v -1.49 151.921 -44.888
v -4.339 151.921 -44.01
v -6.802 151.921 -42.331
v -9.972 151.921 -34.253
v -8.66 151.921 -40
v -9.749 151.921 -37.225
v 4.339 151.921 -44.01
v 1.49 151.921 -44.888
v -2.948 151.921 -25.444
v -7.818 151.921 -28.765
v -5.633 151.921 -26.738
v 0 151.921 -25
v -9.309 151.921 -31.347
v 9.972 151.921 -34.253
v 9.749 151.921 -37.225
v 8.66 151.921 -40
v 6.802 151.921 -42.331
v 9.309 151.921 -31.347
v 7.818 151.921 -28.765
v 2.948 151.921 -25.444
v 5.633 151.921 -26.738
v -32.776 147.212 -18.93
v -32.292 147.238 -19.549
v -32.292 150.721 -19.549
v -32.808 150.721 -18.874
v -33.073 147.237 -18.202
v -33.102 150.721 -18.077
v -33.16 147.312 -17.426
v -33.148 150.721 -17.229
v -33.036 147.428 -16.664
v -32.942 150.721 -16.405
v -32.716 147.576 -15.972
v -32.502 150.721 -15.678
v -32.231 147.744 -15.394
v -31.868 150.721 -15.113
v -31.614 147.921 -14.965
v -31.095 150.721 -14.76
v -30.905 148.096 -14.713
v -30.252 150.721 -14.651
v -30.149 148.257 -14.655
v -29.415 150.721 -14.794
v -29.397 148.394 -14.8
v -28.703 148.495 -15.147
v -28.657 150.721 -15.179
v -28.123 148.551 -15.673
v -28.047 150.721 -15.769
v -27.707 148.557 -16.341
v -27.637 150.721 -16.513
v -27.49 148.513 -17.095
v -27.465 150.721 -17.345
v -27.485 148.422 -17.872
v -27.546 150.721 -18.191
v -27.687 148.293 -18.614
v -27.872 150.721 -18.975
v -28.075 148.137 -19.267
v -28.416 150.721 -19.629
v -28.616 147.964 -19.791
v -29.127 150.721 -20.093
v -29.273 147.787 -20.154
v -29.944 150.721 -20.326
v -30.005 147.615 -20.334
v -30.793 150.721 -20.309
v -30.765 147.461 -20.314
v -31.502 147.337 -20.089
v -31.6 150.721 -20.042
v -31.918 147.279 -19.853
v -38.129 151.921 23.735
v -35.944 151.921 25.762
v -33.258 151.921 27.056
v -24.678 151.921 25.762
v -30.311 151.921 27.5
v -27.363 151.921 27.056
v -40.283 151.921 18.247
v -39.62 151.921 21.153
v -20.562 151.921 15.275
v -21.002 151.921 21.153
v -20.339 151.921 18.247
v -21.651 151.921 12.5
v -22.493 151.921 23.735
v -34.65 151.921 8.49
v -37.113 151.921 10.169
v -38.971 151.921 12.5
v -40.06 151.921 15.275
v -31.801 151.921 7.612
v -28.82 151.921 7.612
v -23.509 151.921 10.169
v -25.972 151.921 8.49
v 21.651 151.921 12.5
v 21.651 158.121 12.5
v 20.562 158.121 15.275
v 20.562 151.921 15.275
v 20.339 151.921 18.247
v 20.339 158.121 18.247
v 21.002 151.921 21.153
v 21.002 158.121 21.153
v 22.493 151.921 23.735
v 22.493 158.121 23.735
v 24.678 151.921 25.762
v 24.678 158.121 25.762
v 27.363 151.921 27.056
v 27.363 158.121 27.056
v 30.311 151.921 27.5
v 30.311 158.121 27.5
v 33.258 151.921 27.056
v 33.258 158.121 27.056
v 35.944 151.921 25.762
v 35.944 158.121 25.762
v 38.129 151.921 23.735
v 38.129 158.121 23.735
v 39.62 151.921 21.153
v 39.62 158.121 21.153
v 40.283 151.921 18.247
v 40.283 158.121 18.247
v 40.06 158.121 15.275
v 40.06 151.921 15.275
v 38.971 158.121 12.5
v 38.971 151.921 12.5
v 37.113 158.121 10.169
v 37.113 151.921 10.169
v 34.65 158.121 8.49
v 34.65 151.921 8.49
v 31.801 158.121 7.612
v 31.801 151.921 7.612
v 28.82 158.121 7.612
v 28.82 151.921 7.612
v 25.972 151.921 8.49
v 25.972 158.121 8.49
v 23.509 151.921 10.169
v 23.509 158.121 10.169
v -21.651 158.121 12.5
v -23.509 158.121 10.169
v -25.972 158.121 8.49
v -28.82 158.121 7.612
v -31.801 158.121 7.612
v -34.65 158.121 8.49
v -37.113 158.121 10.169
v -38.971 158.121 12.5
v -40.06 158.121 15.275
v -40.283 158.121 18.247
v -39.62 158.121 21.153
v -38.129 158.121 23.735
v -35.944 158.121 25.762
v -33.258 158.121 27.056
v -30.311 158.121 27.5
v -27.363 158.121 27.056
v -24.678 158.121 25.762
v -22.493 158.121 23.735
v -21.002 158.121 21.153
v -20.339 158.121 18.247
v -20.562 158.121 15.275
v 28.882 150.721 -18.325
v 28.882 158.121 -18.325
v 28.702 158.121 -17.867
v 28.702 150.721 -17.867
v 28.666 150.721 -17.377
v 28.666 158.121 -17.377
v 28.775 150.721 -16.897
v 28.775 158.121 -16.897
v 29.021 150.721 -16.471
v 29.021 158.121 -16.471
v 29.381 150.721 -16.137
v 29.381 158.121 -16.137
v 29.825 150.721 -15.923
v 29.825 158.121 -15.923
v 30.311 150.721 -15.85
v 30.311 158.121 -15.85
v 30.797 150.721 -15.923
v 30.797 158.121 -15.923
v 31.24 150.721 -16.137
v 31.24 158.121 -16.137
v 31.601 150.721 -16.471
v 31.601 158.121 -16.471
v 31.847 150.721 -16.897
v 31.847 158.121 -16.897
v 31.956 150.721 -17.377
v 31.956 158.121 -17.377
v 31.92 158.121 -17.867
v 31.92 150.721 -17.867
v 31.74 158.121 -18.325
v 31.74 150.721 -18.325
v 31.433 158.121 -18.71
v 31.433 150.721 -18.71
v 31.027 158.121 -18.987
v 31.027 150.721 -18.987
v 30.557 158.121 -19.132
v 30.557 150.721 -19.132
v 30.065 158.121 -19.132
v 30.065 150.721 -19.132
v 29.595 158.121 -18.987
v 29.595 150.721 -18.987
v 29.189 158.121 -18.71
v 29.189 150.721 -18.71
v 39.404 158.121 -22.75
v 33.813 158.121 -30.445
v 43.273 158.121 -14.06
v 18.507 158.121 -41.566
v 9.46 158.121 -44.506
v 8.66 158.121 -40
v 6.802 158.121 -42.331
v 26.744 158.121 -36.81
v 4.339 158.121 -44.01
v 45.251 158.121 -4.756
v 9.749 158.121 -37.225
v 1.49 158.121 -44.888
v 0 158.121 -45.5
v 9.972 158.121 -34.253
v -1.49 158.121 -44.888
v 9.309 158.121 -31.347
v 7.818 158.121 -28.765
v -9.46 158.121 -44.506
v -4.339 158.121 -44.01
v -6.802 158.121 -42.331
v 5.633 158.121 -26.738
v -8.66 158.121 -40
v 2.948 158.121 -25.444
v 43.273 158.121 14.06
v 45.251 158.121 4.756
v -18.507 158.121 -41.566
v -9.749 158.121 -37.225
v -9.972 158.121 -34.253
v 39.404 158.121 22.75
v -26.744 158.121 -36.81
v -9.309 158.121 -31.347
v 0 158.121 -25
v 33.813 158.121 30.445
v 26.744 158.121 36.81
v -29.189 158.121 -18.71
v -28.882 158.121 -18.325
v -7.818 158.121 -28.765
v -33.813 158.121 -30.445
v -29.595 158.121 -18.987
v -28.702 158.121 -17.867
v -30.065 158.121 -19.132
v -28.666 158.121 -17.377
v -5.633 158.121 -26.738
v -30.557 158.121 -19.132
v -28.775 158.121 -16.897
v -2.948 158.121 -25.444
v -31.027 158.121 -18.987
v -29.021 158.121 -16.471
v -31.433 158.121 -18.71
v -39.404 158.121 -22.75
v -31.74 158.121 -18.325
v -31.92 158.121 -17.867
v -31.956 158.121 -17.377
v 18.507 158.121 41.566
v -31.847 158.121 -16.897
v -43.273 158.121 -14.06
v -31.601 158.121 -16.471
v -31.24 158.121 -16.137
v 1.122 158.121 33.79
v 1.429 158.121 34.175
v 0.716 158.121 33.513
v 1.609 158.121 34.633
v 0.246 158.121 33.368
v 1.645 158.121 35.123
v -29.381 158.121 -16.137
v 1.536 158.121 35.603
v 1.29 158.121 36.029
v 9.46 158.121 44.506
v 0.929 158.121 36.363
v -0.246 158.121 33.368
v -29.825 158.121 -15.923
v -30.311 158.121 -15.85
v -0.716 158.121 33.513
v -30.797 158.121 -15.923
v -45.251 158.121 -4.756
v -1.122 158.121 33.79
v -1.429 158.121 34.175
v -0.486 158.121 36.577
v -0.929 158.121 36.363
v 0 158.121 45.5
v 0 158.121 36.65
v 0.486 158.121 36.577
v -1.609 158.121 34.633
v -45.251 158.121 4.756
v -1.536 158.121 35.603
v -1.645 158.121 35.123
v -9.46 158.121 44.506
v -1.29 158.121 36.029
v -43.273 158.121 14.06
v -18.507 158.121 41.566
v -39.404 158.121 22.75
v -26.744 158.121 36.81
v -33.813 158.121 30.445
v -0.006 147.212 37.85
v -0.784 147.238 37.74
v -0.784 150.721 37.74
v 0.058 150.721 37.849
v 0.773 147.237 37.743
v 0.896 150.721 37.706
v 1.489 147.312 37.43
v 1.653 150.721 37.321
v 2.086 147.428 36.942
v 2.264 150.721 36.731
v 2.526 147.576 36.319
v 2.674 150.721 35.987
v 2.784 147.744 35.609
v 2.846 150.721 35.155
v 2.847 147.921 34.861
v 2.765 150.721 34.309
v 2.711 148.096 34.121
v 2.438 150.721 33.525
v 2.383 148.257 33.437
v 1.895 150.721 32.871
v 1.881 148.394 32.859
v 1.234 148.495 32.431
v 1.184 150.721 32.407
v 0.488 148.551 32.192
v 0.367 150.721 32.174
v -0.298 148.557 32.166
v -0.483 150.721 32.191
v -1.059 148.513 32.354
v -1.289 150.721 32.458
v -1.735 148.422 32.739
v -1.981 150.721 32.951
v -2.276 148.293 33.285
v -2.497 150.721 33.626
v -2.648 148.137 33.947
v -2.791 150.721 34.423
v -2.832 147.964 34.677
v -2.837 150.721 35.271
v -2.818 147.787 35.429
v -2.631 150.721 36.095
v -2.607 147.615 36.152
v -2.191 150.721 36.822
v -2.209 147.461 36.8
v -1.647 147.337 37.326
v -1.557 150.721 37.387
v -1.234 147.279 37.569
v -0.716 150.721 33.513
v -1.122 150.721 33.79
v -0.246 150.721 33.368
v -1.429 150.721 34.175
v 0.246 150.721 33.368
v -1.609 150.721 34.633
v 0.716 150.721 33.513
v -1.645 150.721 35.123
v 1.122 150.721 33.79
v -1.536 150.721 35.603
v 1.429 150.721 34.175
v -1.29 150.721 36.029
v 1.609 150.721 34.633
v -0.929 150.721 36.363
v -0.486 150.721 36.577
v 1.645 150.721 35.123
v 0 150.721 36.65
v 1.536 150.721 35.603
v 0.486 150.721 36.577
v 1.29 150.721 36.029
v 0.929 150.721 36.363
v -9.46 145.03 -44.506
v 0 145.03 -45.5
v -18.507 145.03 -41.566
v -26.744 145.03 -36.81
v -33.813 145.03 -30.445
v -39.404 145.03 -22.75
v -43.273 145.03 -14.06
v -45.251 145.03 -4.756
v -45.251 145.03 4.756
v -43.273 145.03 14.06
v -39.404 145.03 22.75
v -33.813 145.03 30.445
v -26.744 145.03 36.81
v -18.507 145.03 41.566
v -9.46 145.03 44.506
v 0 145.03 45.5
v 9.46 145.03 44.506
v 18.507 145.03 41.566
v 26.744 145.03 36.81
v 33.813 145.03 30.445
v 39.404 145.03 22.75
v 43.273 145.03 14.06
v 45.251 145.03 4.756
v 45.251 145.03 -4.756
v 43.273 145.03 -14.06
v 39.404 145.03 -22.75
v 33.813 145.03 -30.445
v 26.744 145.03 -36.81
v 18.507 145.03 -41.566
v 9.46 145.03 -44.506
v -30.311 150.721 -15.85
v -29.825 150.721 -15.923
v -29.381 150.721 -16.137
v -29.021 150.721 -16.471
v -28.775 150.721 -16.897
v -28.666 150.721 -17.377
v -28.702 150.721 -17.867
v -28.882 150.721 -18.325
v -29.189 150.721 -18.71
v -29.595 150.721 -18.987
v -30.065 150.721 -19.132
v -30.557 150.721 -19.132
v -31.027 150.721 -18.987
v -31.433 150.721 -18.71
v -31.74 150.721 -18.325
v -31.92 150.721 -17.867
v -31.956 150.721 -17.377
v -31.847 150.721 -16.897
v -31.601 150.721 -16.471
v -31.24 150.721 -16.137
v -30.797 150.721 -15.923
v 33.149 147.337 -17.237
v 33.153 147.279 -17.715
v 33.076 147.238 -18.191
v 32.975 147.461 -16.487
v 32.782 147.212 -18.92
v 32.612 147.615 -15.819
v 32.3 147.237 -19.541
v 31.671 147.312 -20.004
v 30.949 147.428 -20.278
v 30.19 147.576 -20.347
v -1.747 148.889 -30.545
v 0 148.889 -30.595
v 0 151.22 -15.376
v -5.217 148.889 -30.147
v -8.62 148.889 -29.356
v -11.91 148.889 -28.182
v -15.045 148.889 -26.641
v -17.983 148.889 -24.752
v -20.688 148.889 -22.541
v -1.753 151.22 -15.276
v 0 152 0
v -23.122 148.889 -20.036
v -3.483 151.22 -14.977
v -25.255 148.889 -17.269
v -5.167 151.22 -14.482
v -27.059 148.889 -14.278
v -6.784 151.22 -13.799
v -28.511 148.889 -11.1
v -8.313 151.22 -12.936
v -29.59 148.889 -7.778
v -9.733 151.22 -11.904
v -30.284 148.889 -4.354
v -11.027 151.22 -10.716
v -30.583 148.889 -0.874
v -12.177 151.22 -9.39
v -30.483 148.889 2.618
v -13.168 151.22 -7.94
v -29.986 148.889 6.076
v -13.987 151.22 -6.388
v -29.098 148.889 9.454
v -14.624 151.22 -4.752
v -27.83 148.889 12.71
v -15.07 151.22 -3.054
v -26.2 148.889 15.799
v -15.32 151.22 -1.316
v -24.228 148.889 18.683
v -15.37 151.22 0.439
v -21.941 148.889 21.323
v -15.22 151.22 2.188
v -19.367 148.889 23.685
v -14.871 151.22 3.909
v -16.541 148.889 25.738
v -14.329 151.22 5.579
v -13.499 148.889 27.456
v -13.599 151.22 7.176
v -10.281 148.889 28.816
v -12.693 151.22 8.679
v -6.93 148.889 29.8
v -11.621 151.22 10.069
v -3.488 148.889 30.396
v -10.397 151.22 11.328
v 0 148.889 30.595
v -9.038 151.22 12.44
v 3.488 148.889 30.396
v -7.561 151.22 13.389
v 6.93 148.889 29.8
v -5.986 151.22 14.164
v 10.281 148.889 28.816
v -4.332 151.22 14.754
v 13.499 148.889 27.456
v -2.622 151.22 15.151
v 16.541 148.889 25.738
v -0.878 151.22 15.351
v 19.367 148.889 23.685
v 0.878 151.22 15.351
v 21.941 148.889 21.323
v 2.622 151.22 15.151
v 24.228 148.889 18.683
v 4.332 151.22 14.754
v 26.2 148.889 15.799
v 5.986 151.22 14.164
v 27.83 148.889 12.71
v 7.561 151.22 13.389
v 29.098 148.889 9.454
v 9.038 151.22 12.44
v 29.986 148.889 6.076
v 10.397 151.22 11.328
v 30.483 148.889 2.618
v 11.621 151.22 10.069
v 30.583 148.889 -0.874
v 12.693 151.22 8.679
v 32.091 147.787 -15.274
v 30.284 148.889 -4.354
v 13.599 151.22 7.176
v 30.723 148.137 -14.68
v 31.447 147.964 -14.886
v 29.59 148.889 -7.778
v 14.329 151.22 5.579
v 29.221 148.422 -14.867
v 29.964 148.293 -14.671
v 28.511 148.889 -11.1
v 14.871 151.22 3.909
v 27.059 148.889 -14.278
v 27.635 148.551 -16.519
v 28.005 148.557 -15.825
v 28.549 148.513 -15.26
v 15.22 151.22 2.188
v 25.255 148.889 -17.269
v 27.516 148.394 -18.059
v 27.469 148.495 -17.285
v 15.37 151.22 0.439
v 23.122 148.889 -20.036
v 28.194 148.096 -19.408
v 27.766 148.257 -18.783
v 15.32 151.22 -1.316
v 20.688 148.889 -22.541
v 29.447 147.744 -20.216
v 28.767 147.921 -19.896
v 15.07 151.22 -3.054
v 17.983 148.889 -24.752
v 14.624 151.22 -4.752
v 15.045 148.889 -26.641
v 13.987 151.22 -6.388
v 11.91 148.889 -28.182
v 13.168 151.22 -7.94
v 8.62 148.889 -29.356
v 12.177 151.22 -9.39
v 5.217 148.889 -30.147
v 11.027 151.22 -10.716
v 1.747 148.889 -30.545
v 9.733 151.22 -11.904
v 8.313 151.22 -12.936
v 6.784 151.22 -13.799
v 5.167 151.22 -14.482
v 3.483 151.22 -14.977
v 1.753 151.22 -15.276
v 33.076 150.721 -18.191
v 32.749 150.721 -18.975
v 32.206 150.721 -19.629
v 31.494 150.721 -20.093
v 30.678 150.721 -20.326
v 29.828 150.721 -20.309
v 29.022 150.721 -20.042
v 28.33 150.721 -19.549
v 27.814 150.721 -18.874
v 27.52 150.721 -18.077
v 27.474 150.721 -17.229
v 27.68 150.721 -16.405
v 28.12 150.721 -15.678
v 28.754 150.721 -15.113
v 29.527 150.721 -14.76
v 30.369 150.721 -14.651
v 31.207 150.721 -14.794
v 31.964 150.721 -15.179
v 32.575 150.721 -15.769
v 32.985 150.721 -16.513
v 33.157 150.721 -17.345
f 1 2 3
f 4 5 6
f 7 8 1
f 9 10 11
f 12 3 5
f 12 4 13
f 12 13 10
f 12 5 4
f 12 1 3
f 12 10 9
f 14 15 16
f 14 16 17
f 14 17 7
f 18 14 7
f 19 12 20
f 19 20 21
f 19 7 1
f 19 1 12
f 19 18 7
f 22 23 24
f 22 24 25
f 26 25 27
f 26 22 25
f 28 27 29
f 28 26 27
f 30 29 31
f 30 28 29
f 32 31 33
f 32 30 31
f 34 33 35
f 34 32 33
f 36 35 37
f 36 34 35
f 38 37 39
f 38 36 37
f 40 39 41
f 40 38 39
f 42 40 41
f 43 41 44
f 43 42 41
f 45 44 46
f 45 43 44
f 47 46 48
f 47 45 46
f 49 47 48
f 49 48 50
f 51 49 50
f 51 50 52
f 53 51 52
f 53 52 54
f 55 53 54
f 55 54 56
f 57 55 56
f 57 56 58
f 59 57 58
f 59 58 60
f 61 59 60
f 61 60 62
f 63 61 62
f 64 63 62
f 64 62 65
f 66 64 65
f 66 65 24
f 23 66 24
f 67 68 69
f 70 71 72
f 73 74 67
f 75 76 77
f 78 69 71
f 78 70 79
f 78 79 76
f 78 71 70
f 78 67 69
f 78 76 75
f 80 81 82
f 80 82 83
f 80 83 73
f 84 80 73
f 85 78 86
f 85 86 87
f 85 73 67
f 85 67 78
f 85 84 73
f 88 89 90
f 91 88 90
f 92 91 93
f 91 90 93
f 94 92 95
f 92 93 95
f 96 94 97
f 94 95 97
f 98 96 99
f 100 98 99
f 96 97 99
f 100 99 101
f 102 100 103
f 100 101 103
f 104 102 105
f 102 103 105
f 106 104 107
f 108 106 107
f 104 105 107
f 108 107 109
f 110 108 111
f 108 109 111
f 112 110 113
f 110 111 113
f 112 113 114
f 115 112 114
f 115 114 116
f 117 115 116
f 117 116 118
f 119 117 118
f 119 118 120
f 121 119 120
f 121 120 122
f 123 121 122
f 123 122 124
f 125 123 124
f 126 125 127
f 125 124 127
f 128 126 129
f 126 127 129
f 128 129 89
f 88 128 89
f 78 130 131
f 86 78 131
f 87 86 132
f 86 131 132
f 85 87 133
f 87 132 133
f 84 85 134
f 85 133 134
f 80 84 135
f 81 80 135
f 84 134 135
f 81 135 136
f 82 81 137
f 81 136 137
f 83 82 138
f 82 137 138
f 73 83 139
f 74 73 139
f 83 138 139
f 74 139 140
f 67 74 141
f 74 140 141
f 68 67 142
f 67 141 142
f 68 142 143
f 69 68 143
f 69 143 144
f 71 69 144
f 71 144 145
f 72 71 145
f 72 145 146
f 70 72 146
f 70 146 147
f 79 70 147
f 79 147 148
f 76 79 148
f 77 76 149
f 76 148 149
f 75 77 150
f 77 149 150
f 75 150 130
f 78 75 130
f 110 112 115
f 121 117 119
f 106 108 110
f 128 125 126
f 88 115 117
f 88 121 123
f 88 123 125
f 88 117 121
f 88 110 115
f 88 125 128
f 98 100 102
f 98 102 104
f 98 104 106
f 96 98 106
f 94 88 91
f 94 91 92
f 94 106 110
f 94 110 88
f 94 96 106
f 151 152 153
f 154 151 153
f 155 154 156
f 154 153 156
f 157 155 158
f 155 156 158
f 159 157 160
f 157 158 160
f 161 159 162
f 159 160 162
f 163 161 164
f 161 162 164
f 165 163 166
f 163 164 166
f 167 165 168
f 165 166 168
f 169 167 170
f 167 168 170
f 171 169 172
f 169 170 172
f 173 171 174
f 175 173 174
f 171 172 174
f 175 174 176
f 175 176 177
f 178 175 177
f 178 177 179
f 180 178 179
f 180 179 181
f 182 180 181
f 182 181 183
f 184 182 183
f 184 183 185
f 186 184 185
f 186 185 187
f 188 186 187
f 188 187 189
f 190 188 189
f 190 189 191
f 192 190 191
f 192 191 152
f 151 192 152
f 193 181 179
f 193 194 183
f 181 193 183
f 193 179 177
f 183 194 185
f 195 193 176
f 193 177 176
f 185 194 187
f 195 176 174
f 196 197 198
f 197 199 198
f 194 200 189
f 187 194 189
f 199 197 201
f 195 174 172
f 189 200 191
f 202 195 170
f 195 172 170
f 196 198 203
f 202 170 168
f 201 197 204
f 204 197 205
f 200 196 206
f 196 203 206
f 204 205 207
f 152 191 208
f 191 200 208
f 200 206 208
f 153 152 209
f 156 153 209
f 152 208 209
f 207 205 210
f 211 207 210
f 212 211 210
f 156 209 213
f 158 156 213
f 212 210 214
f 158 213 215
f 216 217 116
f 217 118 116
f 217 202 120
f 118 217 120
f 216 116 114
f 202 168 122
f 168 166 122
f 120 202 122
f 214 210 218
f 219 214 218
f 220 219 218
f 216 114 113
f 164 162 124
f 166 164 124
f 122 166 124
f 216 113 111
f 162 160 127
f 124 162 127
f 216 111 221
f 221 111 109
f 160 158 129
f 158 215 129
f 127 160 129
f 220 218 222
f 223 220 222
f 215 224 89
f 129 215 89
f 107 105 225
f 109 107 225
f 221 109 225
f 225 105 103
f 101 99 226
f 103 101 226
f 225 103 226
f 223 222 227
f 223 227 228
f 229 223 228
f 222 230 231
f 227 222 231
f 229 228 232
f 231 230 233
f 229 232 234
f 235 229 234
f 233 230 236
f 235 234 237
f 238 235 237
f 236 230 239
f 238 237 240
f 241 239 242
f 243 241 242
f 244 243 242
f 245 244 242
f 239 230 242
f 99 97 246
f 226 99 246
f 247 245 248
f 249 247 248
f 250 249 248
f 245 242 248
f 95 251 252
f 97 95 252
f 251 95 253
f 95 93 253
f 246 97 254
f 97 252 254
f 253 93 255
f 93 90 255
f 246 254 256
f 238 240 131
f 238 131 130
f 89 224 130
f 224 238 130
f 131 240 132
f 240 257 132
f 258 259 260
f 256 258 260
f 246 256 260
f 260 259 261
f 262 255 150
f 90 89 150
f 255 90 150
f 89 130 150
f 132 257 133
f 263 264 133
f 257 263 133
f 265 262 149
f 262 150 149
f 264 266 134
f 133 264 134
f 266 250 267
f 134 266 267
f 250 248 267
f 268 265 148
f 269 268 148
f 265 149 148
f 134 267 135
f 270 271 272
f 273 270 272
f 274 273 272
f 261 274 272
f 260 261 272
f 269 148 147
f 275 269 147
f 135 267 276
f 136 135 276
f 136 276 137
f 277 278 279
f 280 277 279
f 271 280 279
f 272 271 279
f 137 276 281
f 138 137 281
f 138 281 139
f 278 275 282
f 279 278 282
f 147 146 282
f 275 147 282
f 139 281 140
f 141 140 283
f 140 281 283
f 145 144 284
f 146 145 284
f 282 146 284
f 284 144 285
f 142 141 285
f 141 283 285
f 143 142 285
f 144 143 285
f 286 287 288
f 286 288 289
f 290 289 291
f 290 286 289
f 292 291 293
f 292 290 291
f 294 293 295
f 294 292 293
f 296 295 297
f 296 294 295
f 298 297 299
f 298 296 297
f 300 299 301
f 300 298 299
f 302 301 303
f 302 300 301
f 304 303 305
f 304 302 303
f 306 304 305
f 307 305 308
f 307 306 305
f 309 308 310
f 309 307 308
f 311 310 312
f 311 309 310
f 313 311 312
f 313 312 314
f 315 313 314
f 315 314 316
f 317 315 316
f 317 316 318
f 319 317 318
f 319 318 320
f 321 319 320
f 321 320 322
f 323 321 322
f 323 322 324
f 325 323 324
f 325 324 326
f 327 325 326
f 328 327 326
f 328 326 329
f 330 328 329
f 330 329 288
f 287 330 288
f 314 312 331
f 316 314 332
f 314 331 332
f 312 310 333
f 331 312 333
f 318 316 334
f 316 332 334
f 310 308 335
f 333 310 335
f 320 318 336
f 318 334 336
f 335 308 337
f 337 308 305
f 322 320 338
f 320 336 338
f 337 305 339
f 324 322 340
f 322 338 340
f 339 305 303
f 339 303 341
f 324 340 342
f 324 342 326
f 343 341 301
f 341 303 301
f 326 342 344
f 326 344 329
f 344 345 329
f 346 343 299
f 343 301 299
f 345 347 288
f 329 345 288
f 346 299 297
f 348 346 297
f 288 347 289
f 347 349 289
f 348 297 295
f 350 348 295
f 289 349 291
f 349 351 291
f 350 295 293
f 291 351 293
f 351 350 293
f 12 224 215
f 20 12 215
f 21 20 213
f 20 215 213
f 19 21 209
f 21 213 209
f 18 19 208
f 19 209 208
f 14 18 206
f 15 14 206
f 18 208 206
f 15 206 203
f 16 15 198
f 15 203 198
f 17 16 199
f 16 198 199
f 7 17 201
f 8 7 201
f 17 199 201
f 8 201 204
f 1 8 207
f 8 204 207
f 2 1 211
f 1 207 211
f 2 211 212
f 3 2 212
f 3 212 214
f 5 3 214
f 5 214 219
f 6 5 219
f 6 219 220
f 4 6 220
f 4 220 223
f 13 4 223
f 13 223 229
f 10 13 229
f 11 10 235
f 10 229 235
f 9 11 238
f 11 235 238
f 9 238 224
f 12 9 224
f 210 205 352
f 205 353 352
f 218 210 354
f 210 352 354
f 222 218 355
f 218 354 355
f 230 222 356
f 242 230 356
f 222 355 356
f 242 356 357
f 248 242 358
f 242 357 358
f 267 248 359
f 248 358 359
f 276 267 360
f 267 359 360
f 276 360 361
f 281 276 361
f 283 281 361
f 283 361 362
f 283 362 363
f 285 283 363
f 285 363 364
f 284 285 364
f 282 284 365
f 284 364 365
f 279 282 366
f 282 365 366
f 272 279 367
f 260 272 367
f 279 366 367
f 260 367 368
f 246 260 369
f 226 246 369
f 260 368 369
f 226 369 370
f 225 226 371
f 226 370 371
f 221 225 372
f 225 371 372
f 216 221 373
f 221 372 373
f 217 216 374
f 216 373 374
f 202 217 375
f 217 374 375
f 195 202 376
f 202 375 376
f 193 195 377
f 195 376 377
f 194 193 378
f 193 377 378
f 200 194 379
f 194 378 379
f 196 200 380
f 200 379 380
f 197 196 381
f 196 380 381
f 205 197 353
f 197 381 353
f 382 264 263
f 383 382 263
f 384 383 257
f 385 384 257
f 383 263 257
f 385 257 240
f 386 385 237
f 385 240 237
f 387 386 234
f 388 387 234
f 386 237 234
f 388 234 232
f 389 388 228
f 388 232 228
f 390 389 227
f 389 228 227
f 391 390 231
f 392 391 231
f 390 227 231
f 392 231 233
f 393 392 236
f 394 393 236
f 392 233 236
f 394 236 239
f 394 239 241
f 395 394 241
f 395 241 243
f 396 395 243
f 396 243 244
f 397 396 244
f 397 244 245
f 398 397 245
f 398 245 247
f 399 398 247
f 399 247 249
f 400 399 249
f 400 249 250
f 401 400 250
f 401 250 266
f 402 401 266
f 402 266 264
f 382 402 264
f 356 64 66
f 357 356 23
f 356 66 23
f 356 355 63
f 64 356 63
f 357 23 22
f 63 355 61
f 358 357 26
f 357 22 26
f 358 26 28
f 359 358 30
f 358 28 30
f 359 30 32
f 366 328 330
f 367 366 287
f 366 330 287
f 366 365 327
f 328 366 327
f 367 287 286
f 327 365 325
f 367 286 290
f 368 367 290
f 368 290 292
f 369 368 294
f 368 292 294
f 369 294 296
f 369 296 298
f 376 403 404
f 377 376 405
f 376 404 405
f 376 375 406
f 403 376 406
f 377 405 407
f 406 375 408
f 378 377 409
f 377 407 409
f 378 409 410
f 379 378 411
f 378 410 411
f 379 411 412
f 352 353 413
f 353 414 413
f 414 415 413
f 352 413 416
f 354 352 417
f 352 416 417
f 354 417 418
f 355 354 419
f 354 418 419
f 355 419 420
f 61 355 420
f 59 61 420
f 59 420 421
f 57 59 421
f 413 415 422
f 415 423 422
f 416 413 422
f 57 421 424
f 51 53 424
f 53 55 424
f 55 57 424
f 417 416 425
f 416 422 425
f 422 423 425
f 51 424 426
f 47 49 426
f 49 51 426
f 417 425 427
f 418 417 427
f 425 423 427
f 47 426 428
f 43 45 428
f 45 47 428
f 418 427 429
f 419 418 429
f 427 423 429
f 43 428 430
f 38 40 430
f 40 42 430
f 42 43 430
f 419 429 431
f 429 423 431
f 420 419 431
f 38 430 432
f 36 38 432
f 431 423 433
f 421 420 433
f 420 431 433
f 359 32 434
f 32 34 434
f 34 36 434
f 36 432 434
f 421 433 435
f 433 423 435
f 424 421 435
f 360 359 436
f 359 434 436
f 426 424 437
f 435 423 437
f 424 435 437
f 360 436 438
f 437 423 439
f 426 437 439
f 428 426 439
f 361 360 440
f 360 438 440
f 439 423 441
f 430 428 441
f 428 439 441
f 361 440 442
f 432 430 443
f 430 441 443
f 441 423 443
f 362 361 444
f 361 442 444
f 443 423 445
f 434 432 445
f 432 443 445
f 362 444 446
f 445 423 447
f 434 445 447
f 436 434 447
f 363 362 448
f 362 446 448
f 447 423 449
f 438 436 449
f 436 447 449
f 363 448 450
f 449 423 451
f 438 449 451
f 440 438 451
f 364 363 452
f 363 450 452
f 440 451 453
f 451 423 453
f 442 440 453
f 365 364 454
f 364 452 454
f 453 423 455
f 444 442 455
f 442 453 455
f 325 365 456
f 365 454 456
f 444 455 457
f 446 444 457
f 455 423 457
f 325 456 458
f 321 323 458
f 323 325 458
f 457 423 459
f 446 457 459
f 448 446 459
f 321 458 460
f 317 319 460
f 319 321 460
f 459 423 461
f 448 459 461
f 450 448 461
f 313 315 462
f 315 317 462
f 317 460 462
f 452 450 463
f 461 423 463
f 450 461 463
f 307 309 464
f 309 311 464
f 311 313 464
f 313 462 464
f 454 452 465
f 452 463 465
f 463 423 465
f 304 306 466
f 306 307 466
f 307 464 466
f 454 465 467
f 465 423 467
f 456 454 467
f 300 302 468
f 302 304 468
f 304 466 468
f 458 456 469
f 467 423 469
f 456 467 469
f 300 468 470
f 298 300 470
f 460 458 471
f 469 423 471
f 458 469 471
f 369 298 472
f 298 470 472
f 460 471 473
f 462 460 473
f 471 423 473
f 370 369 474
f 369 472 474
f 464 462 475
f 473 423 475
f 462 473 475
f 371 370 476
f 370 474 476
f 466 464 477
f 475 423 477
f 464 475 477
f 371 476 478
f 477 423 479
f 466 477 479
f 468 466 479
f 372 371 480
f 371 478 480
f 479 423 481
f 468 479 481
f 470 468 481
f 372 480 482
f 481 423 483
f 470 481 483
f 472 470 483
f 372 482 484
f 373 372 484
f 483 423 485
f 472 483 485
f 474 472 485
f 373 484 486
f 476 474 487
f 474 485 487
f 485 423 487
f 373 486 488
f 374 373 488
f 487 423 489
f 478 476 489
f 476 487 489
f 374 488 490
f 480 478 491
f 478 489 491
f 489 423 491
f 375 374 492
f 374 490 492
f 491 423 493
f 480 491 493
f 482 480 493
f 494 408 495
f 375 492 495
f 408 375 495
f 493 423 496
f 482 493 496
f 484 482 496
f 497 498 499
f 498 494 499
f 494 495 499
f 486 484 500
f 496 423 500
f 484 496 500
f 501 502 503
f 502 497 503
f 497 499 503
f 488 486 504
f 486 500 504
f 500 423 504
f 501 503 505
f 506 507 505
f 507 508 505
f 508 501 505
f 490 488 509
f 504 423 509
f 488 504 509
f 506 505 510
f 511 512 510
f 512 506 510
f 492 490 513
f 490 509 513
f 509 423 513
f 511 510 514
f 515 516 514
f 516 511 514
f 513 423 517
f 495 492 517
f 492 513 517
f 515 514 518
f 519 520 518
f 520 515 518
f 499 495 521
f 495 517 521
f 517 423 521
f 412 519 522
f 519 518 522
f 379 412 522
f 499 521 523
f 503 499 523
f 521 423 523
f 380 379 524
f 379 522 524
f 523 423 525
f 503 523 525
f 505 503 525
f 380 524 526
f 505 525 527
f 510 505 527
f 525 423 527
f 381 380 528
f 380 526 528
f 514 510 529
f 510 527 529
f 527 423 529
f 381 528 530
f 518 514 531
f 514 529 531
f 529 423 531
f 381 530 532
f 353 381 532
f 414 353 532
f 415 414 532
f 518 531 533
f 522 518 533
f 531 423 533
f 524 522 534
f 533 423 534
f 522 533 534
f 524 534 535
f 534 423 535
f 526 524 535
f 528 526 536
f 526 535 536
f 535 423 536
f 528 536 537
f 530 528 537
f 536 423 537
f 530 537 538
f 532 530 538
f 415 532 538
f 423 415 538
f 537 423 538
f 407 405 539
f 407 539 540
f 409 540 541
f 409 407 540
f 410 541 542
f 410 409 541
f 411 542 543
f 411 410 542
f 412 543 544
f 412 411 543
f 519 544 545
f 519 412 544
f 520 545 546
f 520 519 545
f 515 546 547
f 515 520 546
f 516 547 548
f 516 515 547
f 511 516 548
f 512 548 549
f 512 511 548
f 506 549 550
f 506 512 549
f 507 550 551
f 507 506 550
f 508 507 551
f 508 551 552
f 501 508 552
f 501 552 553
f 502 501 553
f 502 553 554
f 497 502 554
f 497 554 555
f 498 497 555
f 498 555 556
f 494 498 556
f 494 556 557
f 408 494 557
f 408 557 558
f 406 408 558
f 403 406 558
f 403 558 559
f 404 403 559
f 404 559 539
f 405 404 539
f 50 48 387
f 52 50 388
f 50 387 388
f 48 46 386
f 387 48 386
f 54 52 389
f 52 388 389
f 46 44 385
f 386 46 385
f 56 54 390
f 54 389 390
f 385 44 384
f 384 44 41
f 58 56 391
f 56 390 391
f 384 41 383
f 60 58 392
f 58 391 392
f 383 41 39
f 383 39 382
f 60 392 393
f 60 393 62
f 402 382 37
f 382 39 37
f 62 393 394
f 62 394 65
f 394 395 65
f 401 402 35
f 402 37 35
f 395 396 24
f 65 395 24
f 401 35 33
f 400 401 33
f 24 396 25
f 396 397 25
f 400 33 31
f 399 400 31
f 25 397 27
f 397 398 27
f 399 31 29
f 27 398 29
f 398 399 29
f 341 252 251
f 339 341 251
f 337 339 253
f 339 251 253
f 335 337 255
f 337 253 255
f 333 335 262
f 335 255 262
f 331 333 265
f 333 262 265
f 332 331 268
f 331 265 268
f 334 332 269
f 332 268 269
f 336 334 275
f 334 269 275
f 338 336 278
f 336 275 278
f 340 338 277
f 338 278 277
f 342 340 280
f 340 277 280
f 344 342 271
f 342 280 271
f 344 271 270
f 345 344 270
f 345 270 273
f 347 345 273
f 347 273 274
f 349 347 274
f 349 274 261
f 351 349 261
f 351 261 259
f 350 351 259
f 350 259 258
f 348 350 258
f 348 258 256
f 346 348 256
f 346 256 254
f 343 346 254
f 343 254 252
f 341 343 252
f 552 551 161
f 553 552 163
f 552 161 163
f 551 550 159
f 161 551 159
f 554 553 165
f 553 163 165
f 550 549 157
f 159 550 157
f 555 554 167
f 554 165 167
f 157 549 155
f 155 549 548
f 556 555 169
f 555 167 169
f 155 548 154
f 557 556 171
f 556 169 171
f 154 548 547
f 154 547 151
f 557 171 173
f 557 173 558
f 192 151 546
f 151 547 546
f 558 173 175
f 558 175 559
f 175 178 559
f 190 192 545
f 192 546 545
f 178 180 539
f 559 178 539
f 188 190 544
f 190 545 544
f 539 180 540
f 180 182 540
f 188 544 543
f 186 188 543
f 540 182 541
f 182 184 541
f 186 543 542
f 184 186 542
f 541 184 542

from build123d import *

# Parameters (mm, degrees)
ESQUISSE11_R                 = 10
ENL_V_MAT_EXTRU_4_DEPTH      = 6.2
ESQUISSE12_R                 = 1.65
ENL_V_MAT_EXTRU_5_DEPTH      = 66.664775353
ESQUISSE14_R                 = 2.85
ENL_V_MAT_EXTRU_8_DEPTH      = 3.6
R_P_TITION_CIRCULAIRE7_COUNT = 3


with BuildPart() as part:
    # Esquisse1 → Révolution1 (revolve)
    with BuildSketch(Plane.XY, mode=Mode.PRIVATE) as r_volution1_sk:
        with BuildLine():
            Line((-45.5, 158.120727786), (-45.5, 145.030169275))
            ThreePointArc((-45.5, 145.030169275), (-23.015367368, 150.247438797), (0, 152))
            Line((0, 152), (0, 158.120727786))
            Line((0, 158.120727786), (-45.5, 158.120727786))
        make_face()
    revolve(r_volution1_sk.sketch.rotate(Axis((0, 0, 0), (0, 1, 0)), 270), axis=Axis((0, 0, 0), (0, 1, 0)))

    # Esquisse11 → Enlèv. mat.-Extru.4 (cut)
    with BuildSketch(Plane(origin=(0, 158.120727786, 0), x_dir=(1, 0, 0), z_dir=(0, 1, 0))):
        with Locations(Location((0, 35, 0), (0, 0, 270))):
            Circle(ESQUISSE11_R)
    enl_v_mat_extru_4 = extrude(amount=-ENL_V_MAT_EXTRU_4_DEPTH, mode=Mode.SUBTRACT)

    # Esquisse12 → Enlèv. mat.-Extru.5 (cut, through all)
    with BuildSketch(Plane(origin=(0, 158.120727786, 0), x_dir=(1, 0, 0), z_dir=(0, 1, 0))):
        with Locations(Location((-30.310889132, 17.5, 0), (0, 0, 270))):
            Circle(ESQUISSE12_R)
    enl_v_mat_extru_5 = extrude(amount=-ENL_V_MAT_EXTRU_5_DEPTH, mode=Mode.SUBTRACT)

    # Esquisse14 → Enlèv. mat.-Extru.8 (cut)
    with BuildSketch(Plane(origin=(0, 147.120727786, 0), x_dir=(1, 0, 0), z_dir=(0, 1, 0))):
        with Locations(Location((-30.310889132, 17.5, 0), (0, 0, 134.033255464))):
            Circle(ESQUISSE14_R)
    enl_v_mat_extru_8 = extrude(amount=ENL_V_MAT_EXTRU_8_DEPTH, mode=Mode.SUBTRACT)

    # Répétition circulaire7: Enlèv. mat.-Extru.4, Enlèv. mat.-Extru.5, Enlèv. mat.-Extru.8 ×3 about axis
    r_p_tition_circulaire7_axis = Axis((0, 0, 0), (0, 1, 0))
    add([enl_v_mat_extru_4.rotate(r_p_tition_circulaire7_axis, i * 360 / R_P_TITION_CIRCULAIRE7_COUNT) for i in range(1, R_P_TITION_CIRCULAIRE7_COUNT)], mode=Mode.SUBTRACT)
    add([enl_v_mat_extru_5.rotate(r_p_tition_circulaire7_axis, i * 360 / R_P_TITION_CIRCULAIRE7_COUNT) for i in range(1, R_P_TITION_CIRCULAIRE7_COUNT)], mode=Mode.SUBTRACT)
    add([enl_v_mat_extru_8.rotate(r_p_tition_circulaire7_axis, i * 360 / R_P_TITION_CIRCULAIRE7_COUNT) for i in range(1, R_P_TITION_CIRCULAIRE7_COUNT)], mode=Mode.SUBTRACT)


solid = part.part
